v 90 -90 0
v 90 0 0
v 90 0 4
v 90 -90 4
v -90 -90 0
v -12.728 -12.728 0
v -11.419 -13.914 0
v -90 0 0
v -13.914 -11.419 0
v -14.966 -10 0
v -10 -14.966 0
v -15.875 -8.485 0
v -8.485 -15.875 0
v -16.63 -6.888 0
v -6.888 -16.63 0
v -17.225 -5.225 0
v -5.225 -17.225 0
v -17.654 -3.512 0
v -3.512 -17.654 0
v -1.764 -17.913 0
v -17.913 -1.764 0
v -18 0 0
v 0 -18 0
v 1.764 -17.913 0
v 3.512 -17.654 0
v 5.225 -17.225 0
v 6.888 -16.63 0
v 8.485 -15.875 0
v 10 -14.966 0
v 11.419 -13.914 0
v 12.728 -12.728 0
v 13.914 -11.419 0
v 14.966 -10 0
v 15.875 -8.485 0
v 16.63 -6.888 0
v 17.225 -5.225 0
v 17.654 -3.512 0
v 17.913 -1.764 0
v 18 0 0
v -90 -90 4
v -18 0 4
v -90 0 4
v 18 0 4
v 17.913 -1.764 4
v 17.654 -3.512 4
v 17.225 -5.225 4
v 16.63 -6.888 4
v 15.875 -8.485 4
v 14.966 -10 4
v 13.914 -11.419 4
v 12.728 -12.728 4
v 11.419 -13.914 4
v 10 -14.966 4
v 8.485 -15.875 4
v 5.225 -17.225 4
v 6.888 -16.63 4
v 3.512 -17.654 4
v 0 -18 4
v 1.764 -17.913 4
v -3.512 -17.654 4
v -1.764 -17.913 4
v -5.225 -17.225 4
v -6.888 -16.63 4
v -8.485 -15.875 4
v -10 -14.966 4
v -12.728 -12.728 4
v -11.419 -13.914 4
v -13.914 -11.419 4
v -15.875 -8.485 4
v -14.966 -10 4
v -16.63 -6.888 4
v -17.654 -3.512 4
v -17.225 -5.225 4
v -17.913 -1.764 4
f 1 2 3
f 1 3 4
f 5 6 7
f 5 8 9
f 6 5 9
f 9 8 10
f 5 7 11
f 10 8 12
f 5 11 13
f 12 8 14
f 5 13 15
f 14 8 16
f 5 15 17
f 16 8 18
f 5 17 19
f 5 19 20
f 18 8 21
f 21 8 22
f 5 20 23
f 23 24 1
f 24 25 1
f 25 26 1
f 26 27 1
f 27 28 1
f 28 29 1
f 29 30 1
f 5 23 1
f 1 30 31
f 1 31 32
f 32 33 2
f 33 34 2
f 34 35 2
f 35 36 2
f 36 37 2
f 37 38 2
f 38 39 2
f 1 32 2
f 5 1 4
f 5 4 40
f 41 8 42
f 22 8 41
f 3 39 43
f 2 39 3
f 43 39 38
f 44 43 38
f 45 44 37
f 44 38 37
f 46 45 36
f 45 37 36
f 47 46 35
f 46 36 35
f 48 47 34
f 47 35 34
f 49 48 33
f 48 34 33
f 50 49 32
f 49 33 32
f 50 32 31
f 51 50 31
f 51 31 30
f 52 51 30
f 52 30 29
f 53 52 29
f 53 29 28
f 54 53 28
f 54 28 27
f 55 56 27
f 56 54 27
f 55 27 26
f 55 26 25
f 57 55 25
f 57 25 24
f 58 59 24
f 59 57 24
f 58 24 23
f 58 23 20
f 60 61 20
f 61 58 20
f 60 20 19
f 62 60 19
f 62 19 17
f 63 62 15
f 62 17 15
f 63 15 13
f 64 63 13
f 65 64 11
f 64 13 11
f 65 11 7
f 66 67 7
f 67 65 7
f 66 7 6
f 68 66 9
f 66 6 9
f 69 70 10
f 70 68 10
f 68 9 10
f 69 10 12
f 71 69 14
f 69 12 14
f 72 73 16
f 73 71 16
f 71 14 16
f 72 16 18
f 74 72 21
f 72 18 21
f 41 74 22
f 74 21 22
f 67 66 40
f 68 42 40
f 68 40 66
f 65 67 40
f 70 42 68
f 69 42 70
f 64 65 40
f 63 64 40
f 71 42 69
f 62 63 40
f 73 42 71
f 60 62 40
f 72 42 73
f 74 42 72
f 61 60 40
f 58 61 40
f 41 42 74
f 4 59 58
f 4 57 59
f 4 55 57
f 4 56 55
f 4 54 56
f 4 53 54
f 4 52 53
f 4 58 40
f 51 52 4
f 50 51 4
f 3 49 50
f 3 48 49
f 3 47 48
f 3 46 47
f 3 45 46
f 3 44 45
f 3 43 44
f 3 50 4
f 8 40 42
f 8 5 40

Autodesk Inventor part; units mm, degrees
ref_plane "YZ Plane" through (0, 0, 0) normal (1, 0, 0) x (0, 1, 0)
ref_plane "XZ Plane" through (0, 0, 0) normal (0, 1, 0) x (-1, 0, 0)
ref_plane "XY Plane" through (0, 0, 0) normal (0, 0, 1) x (1, 0, 0)
sketch "Sketch1" plane through (0, 0, 0) normal (0, 0, 1) x (1, 0, 0)
  line L0 (90, 0) -> (90, -90)
  line L1 (90, -90) -> (-90, -90)
  line L2 (-90, -90) -> (-90, 0)
  arc A0 (-18, 0) -> (18, 0) centre (0, 0) ccw
  line L3 (-90, 0) -> (-18, 0)
  line L4 (18, 0) -> (90, 0)
  dimension "d0" = 90
  dimension "d1" = 180
  dimension "d2" = 90
  dimension "d3" = 36
  dimension "d6" = 90
  dimension "d7" = 0
extrude "Extrusion1" add sketch "Sketch1" along normal blind 4
equation "\"BendRadius\" = Thickness"
equation "\"BendReliefWidth\" = Thickness"
equation "\"BendReliefDepth\" = 0.5 * Thickness"
equation "\"CornerReliefSize\" = 4 * Thickness"
equation "\"MinimumRemnant\" = 2 * Thickness"
equation "\"TransitionRadius\" = BendRadius"
equation "\"JacobiRadiusSize\" = BendRadius"
equation "\"GapSize\" = Thickness"
equation "\"Thickness\" = 0.5"
properties part number "Joint housing cover"
